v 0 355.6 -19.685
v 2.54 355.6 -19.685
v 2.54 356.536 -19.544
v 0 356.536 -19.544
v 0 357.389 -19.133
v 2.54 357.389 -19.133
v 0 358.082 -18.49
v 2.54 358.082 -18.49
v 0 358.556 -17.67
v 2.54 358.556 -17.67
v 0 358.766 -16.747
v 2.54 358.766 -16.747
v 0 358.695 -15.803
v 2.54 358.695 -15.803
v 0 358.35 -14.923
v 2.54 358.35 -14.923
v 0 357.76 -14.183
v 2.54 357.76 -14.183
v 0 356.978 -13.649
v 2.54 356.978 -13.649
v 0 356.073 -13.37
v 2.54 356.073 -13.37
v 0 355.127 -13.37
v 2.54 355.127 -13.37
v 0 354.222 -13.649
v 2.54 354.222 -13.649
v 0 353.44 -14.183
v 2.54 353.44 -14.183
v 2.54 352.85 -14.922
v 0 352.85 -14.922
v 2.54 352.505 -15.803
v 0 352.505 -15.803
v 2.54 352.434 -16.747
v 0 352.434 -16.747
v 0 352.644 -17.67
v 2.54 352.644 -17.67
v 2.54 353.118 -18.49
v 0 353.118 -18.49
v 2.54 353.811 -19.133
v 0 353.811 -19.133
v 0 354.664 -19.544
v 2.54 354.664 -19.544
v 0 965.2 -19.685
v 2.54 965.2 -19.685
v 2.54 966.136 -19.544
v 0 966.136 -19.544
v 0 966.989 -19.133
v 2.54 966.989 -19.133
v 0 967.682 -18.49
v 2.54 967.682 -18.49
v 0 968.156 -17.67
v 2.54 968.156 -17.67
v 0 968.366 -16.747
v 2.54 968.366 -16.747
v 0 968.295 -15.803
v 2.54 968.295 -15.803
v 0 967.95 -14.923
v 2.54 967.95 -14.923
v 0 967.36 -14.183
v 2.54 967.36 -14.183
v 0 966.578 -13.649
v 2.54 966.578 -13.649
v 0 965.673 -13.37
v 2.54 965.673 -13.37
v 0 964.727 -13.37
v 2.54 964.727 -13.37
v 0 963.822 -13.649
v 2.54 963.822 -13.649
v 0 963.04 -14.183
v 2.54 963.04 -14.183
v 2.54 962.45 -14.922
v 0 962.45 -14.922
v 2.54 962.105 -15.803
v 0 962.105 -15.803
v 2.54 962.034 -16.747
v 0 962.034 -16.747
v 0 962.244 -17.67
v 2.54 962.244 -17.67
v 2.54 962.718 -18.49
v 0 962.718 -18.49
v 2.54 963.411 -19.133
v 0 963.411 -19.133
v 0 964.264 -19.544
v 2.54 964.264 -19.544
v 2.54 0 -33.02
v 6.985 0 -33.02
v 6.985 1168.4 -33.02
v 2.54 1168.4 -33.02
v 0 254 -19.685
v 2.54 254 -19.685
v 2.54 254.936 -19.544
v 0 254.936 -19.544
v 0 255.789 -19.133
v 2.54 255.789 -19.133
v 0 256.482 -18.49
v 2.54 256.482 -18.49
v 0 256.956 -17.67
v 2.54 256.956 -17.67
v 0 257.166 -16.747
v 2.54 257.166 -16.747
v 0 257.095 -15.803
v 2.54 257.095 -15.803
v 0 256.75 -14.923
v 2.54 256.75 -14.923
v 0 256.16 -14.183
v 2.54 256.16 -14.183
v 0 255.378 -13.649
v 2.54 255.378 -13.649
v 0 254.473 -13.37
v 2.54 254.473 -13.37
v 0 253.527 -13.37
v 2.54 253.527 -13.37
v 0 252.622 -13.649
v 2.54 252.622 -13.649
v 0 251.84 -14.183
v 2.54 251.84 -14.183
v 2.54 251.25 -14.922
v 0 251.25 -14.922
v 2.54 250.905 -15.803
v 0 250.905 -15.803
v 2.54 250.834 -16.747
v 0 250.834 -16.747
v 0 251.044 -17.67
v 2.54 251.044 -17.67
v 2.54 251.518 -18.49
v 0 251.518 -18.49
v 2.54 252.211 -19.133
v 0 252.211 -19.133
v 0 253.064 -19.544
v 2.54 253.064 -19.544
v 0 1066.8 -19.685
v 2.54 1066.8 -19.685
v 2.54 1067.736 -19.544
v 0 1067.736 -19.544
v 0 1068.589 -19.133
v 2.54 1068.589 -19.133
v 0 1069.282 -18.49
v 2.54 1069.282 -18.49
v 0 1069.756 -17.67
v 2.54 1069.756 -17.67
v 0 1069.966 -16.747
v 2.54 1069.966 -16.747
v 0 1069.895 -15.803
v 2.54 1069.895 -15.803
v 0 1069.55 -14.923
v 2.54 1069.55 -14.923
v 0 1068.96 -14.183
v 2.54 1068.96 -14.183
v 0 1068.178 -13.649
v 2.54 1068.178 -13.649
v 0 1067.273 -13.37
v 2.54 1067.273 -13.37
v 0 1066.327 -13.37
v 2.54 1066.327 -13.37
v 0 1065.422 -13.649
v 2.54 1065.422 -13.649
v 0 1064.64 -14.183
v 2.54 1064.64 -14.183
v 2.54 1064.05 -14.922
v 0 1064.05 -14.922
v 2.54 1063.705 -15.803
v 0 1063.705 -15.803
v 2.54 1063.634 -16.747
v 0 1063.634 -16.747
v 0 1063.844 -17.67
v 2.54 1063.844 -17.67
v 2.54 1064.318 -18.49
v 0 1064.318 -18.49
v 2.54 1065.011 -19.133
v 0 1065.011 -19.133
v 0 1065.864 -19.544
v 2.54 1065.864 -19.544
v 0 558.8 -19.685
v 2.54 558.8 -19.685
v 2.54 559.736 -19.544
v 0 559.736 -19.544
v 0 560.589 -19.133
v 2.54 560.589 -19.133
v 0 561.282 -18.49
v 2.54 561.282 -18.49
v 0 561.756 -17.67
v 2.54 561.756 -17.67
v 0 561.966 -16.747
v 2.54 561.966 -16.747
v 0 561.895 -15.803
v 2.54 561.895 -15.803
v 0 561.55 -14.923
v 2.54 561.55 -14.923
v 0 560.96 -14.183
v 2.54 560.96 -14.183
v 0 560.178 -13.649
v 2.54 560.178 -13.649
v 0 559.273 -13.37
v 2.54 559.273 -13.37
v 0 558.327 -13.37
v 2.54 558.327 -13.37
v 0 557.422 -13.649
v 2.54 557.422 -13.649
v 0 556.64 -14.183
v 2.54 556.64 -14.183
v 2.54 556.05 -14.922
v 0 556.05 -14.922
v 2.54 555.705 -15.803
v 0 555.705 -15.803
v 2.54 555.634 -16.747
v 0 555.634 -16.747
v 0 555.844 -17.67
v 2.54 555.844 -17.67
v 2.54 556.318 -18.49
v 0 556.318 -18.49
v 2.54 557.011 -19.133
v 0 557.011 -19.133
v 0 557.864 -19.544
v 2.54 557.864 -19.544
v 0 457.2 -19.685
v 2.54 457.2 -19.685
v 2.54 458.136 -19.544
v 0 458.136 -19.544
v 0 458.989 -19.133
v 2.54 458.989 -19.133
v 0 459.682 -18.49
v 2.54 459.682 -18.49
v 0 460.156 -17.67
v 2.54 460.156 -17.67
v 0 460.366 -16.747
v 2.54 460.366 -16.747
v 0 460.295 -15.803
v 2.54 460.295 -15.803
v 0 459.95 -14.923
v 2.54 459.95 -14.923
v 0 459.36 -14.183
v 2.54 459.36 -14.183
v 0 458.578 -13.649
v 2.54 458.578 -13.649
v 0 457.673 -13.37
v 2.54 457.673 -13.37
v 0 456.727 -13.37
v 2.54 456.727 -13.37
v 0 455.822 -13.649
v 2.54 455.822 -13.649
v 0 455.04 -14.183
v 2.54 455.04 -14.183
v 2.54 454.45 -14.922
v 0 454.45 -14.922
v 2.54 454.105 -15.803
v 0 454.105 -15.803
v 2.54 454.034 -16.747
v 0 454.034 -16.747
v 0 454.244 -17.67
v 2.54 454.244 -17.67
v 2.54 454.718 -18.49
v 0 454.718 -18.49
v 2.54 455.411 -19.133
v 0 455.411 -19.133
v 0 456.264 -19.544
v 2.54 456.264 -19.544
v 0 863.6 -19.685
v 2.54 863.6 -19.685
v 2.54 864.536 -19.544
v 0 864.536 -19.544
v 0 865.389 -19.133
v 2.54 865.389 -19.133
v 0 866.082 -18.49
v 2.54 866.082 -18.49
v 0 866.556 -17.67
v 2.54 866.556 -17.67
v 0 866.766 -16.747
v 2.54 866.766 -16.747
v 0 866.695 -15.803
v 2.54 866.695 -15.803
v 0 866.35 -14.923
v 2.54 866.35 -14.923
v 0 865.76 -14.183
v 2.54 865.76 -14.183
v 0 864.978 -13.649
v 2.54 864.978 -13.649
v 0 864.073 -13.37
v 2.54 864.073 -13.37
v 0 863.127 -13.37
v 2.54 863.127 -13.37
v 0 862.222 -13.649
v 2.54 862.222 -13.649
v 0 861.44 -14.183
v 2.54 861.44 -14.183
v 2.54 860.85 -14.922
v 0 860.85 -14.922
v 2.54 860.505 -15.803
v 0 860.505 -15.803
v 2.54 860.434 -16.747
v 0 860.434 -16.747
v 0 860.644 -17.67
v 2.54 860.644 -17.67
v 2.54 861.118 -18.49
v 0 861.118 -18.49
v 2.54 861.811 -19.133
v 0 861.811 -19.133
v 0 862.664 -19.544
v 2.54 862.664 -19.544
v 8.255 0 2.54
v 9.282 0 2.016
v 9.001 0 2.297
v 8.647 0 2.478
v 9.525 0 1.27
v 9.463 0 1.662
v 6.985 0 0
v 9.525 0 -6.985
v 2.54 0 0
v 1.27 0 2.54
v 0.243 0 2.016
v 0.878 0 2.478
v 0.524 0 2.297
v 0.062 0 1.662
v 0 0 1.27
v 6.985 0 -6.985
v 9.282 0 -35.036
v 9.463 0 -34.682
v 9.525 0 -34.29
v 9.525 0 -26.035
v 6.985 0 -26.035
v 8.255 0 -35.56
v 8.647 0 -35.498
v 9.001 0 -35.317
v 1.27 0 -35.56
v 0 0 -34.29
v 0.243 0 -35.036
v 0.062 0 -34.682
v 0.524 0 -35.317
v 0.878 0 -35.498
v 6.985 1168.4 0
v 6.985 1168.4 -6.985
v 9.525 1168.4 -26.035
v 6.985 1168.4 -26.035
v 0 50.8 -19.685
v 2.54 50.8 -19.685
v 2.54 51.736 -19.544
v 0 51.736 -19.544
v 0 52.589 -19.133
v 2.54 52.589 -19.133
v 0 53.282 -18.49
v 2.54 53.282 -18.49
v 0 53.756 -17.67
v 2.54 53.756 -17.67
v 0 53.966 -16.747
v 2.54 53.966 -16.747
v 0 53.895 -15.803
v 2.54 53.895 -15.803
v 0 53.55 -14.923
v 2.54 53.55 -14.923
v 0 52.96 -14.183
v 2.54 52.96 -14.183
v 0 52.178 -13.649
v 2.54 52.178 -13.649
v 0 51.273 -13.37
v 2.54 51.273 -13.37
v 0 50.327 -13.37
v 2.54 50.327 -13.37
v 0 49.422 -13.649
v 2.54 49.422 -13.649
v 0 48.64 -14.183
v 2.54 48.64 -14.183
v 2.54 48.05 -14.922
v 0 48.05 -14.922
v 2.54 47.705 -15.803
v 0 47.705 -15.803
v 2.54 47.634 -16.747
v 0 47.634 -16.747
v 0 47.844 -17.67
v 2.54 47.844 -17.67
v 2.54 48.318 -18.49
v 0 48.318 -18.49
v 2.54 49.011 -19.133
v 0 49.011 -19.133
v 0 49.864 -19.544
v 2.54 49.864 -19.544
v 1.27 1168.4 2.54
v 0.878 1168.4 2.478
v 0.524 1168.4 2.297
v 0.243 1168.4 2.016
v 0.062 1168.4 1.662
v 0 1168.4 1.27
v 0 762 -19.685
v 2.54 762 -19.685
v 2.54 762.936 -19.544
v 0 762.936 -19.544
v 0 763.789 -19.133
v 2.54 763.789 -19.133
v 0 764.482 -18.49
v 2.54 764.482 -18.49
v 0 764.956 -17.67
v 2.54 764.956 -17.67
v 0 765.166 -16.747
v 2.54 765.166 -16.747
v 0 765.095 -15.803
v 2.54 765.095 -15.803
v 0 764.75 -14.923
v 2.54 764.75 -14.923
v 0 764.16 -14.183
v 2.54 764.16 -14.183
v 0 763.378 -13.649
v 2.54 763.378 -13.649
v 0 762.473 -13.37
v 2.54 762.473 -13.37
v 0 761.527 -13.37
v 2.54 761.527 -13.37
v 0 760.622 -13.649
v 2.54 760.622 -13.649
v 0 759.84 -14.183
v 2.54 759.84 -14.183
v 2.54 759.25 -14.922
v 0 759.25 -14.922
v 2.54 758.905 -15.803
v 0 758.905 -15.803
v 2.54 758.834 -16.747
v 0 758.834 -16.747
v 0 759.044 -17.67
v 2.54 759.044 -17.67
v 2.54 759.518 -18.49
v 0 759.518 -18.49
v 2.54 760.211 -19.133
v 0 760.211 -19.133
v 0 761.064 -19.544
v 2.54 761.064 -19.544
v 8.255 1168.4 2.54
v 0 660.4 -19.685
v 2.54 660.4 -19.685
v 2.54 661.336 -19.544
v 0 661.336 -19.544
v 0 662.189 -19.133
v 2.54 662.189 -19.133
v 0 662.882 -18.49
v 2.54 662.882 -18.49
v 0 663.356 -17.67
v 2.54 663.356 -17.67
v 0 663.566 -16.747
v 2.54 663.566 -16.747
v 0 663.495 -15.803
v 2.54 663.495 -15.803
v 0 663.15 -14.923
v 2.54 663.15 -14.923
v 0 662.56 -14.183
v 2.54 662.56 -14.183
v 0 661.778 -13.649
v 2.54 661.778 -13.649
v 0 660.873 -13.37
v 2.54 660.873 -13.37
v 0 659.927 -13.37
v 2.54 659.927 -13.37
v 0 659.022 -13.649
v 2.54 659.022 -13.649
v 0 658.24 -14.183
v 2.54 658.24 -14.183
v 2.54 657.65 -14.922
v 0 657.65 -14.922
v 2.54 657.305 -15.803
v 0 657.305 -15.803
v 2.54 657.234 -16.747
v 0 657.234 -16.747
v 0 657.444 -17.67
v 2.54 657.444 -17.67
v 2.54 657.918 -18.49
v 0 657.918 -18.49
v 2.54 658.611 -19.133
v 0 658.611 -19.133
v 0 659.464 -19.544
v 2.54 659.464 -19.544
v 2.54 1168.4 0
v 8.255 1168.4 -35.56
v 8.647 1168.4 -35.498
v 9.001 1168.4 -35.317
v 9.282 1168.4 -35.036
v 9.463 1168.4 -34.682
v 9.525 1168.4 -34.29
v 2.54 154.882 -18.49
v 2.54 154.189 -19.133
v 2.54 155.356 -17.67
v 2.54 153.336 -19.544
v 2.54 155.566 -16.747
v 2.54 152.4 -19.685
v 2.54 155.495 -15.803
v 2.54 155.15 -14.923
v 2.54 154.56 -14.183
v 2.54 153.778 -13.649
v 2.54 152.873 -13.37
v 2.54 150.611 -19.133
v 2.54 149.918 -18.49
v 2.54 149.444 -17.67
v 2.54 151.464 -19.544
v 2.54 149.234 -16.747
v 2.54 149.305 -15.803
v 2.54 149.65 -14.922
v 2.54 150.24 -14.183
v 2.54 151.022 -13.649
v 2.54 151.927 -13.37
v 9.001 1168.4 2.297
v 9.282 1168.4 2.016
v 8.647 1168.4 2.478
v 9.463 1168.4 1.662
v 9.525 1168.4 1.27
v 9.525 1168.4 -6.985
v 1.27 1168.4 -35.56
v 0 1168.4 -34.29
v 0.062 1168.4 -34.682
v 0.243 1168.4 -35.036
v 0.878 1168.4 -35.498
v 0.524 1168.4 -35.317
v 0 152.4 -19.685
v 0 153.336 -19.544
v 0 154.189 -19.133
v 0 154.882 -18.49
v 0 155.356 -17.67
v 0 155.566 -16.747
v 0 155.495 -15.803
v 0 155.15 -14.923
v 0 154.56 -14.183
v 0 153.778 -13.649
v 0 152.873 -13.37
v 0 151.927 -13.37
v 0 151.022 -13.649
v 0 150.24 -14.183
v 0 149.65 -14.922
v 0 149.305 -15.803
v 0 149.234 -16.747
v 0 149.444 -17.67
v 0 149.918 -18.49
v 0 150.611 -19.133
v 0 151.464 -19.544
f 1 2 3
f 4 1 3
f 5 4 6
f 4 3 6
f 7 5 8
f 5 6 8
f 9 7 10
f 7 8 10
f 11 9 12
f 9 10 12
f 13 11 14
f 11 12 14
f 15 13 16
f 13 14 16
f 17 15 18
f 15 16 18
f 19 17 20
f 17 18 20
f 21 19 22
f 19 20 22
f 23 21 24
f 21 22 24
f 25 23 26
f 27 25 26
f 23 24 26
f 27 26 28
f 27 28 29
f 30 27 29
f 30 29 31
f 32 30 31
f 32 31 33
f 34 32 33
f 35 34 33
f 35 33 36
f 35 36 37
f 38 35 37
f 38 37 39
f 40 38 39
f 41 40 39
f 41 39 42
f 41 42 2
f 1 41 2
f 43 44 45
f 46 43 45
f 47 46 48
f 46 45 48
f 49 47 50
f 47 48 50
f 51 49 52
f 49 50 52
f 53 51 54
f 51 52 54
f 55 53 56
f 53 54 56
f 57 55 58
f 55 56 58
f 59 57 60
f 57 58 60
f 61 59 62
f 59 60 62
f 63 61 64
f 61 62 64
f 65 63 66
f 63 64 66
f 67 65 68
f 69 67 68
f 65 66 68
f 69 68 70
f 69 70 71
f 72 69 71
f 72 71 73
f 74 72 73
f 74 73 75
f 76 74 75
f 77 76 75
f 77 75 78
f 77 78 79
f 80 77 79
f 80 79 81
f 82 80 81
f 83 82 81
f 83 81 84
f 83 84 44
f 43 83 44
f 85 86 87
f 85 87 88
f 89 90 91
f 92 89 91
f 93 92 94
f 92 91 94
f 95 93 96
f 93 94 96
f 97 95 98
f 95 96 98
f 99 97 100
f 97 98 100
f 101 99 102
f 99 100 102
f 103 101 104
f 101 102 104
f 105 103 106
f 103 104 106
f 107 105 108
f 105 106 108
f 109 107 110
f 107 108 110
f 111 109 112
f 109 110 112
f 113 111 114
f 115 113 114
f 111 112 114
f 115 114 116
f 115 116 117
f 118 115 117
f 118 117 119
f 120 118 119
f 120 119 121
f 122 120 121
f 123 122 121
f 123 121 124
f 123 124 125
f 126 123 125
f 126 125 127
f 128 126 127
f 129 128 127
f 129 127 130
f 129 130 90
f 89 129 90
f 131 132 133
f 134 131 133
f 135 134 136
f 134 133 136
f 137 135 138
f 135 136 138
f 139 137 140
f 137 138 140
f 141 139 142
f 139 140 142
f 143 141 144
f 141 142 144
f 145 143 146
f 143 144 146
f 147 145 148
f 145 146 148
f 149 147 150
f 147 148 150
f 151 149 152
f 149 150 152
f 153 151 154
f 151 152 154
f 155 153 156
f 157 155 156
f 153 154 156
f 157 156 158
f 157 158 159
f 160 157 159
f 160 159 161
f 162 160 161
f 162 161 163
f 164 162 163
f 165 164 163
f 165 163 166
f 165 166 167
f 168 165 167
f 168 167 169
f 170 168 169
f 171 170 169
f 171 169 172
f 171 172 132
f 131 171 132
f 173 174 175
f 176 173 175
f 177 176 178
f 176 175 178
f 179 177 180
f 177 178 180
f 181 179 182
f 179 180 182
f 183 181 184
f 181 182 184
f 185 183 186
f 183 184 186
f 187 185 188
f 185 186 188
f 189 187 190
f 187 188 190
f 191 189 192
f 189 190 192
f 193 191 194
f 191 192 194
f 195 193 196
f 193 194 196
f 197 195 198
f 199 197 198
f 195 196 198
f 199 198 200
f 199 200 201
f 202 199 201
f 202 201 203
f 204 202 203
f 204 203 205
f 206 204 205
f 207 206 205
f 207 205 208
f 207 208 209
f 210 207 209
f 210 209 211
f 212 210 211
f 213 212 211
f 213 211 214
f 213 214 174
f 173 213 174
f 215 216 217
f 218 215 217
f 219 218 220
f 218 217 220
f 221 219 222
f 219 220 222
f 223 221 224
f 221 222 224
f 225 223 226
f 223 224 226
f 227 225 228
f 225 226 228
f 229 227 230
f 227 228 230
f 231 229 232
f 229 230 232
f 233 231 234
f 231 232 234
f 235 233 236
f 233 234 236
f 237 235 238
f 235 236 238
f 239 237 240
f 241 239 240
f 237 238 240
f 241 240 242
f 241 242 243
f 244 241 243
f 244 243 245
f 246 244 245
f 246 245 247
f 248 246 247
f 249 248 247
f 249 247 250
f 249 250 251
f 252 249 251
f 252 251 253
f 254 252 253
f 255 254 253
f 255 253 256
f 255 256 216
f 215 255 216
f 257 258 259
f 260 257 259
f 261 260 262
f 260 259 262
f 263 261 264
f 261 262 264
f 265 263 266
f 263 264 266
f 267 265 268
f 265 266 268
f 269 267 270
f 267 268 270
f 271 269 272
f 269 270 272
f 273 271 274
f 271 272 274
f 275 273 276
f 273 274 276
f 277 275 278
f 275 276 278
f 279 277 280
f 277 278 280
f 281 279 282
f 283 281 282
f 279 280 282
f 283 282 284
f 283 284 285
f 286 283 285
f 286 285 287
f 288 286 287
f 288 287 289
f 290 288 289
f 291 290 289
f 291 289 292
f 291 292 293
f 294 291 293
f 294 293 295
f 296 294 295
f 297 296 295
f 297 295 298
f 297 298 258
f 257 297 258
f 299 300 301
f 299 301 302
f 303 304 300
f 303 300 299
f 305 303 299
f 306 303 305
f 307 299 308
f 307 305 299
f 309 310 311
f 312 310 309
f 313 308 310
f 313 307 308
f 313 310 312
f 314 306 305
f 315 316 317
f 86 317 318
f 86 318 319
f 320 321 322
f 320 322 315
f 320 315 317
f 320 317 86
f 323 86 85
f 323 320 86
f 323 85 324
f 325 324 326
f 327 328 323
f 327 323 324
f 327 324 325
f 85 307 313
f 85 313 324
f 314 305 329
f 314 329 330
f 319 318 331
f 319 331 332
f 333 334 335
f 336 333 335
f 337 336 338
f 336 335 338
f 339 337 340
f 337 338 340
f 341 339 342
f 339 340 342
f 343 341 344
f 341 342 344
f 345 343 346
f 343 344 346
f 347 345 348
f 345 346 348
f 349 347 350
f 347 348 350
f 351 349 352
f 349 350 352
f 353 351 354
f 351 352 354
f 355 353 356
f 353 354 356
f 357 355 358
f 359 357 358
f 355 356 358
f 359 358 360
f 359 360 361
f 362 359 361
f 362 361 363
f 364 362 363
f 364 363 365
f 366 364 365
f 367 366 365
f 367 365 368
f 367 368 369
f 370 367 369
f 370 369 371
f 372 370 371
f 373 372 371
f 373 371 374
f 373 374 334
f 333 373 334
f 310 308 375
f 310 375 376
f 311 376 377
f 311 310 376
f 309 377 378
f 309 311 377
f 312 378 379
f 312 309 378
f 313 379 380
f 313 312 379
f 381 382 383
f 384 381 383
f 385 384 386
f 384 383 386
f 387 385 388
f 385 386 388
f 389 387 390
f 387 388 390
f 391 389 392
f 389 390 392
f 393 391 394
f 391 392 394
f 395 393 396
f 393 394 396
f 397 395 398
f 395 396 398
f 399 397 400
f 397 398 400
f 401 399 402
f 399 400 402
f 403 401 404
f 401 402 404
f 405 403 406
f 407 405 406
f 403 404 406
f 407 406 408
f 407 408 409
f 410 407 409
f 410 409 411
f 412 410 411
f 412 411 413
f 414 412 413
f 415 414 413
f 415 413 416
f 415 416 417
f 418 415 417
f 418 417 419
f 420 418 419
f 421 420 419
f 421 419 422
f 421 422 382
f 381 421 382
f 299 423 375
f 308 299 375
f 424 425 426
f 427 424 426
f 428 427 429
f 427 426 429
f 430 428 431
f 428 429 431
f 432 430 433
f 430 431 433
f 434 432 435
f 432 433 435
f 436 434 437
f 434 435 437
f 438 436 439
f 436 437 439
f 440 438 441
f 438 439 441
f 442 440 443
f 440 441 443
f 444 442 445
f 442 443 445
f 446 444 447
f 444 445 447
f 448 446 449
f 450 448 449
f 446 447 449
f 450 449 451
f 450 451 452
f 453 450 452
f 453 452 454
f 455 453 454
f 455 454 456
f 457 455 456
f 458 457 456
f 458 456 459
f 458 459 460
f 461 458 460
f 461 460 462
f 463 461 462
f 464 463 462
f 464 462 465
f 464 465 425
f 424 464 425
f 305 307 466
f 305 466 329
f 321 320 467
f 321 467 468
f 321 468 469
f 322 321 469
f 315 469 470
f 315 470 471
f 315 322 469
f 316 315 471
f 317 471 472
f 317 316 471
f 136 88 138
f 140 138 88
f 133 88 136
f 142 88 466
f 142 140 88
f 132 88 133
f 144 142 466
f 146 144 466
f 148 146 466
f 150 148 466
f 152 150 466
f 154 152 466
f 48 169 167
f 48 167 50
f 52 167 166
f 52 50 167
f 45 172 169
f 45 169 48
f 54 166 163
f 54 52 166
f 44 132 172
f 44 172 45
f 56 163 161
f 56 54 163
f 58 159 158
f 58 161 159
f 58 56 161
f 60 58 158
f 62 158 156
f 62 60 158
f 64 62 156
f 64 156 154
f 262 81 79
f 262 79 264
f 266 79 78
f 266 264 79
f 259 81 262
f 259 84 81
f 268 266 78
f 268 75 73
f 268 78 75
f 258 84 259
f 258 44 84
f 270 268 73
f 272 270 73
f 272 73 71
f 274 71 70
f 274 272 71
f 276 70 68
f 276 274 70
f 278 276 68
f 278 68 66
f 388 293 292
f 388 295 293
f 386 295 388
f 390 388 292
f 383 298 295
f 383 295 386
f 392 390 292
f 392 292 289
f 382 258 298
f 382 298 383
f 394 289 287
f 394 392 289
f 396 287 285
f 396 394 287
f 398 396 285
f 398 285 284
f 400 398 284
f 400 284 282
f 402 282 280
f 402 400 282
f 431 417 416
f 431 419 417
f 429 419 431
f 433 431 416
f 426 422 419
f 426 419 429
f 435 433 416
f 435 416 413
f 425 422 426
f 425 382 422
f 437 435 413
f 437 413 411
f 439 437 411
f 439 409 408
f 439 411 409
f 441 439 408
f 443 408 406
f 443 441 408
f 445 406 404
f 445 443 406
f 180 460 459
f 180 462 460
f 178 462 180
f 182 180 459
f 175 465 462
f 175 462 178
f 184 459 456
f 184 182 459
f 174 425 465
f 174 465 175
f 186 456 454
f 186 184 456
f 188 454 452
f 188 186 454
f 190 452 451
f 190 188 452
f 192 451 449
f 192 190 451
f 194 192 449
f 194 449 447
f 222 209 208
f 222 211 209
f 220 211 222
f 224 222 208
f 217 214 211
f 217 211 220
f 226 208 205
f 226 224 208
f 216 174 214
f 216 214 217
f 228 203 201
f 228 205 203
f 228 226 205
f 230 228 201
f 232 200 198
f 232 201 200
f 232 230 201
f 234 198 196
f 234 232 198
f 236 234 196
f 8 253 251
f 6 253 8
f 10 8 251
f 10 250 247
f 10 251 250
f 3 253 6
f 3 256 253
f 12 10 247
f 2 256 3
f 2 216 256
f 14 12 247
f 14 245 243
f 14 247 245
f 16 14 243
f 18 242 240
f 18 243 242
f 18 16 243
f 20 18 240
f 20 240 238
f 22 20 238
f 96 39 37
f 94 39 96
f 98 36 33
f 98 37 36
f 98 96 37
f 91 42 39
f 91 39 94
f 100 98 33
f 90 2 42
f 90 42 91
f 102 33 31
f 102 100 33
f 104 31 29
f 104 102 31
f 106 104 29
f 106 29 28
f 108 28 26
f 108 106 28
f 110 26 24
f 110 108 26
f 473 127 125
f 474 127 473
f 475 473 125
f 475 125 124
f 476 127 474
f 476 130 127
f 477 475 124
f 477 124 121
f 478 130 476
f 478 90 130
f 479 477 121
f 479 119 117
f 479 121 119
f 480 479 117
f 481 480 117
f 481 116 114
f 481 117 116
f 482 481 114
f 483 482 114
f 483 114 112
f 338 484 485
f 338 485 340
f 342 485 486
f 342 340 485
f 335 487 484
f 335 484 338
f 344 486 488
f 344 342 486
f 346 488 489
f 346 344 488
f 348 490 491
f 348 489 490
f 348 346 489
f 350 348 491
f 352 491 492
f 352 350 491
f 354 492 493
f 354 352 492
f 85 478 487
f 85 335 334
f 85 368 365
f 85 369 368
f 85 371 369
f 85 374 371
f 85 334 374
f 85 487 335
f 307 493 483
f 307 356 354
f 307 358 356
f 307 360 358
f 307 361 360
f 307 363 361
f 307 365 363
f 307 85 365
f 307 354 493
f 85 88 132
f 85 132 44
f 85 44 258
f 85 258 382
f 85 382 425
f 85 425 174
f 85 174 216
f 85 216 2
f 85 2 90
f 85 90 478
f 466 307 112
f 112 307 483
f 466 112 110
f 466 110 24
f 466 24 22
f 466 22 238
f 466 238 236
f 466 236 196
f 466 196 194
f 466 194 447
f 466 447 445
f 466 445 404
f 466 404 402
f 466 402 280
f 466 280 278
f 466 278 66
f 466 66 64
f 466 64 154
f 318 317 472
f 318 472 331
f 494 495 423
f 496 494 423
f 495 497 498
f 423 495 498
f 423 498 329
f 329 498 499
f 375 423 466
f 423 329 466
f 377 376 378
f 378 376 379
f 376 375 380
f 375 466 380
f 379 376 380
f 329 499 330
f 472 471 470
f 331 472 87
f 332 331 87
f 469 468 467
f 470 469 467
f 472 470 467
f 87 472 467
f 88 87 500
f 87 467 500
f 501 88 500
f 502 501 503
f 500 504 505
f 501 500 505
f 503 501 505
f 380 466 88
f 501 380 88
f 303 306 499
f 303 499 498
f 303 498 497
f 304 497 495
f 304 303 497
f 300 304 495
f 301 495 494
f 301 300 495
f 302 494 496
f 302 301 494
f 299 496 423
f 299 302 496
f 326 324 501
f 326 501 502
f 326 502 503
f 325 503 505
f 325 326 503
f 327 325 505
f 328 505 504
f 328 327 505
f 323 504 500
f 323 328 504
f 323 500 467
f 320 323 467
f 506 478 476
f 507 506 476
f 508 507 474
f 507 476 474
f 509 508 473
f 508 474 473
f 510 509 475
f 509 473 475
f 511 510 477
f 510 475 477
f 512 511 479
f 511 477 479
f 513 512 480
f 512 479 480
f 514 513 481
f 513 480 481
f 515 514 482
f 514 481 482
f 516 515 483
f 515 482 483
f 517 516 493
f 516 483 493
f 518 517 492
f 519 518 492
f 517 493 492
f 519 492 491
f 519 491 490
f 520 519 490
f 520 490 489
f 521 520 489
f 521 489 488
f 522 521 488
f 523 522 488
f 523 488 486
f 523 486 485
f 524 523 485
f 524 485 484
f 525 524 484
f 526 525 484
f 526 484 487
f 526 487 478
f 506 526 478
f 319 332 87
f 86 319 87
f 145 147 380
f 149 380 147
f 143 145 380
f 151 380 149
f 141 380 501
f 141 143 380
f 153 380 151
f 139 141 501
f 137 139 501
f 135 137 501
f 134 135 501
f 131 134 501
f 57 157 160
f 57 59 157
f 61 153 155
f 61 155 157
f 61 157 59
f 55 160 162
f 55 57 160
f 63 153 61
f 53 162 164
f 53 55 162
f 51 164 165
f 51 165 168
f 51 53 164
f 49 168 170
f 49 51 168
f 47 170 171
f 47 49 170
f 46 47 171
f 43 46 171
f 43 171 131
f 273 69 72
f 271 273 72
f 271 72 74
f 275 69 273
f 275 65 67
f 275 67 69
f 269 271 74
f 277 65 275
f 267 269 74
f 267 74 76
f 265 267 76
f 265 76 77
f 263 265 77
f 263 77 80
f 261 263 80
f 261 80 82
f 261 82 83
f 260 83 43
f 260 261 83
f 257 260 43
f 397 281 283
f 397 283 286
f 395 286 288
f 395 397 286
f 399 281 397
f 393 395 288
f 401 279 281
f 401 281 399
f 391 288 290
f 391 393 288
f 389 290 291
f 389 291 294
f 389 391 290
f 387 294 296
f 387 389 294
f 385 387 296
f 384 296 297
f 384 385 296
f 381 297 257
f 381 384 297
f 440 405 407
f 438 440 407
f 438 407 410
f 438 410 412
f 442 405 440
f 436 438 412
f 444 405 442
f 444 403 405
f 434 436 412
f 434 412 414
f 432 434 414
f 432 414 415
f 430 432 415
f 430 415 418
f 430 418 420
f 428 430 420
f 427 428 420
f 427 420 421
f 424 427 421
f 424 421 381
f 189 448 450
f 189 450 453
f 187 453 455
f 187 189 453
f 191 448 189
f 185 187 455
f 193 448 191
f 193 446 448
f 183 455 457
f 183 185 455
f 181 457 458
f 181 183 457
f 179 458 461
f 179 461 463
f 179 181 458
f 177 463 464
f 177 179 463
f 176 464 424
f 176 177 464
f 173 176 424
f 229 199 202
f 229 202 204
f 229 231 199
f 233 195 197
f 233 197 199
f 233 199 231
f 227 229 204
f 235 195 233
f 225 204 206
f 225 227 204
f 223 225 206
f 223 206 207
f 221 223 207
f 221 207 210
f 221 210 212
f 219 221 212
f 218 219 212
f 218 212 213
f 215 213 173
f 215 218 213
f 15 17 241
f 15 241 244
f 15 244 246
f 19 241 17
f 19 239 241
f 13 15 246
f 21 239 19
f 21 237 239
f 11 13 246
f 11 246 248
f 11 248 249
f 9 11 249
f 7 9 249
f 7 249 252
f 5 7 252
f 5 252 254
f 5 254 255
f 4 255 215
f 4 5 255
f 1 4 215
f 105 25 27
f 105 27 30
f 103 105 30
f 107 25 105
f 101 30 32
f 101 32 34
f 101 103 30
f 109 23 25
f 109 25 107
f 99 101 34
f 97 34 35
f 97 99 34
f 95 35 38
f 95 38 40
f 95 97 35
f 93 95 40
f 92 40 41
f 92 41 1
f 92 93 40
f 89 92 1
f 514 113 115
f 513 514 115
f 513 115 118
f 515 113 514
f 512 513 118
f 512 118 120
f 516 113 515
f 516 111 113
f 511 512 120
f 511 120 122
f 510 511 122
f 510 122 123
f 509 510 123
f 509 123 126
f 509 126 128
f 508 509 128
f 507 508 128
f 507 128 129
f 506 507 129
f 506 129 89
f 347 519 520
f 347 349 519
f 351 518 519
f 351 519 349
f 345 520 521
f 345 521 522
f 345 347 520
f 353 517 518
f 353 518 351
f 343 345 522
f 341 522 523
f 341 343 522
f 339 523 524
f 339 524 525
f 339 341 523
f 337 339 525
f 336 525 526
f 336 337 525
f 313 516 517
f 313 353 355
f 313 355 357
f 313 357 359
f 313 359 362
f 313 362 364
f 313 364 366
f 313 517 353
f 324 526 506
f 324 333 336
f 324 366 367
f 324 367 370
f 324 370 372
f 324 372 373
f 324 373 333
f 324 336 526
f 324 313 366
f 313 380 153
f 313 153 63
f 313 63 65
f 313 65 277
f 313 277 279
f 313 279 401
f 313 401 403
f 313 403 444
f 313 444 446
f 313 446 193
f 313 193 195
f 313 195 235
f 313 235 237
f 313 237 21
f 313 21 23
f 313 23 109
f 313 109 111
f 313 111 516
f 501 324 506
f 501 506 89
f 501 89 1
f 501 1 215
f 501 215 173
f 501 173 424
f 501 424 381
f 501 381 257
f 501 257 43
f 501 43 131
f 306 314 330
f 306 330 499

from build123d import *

# Parameters (mm, degrees)
BOSS_EXTRUDE1_DEPTH = 1168.4
CUT_EXTRUDE1_REACH  = 4.54
SKETCH2_R           = 3.175


with BuildPart() as part:
    # Sketch1 → Boss-Extrude1 (new body)
    with BuildSketch(Plane(origin=(0, 0, 0), x_dir=(1, 0, 0), z_dir=(0, 1, 0))):
        with BuildLine():
            Line((9.525, 34.29), (9.525, 26.035))
            Line((9.525, 26.035), (6.985, 26.035))
            Line((6.985, 26.035), (6.985, 33.02))
            Line((6.985, 33.02), (2.54, 33.02))
            Line((2.54, 33.02), (2.54, 0))
            Line((2.54, 0), (6.985, 0))
            Line((6.985, 0), (6.985, 6.985))
            Line((6.985, 6.985), (9.525, 6.985))
            Line((9.525, 6.985), (9.525, -1.27))
            ThreePointArc((9.525, -1.27), (9.153025612, -2.168025612), (8.255, -2.54))
            Line((8.255, -2.54), (1.27, -2.54))
            ThreePointArc((1.27, -2.54), (0.371974388, -2.168025612), (0, -1.27))
            Line((0, -1.27), (0, 34.29))
            ThreePointArc((0, 34.29), (0.371974388, 35.188025612), (1.27, 35.56))
            Line((1.27, 35.56), (8.255, 35.56))
            ThreePointArc((8.255, 35.56), (9.153025612, 35.188025612), (9.525, 34.29))
        make_face()
    extrude(amount=BOSS_EXTRUDE1_DEPTH)

    # Sketch2 → Cut-Extrude1 (cut, up to next)
    with BuildSketch(Plane(origin=(2.54, 0, 0), x_dir=(0, 0, -1), z_dir=(1, 0, 0)), mode=Mode.PRIVATE) as cut_extrude1_sk1:
        with Locations((16.51, 50.8)):
            Circle(SKETCH2_R)
    cut_extrude1_tool1 = extrude(cut_extrude1_sk1.sketch, amount=-CUT_EXTRUDE1_REACH, mode=Mode.PRIVATE) & part.part
    add(cut_extrude1_tool1.solids().sort_by_distance((2.54, 50.8, -16.51))[0], mode=Mode.SUBTRACT)
    # Sketch2 → Cut-Extrude1 (cut, up to next)
    with BuildSketch(Plane(origin=(2.54, 0, 0), x_dir=(0, 0, -1), z_dir=(1, 0, 0)), mode=Mode.PRIVATE) as cut_extrude1_sk2:
        with Locations((16.51, 152.4)):
            Circle(SKETCH2_R)
    cut_extrude1_tool2 = extrude(cut_extrude1_sk2.sketch, amount=-CUT_EXTRUDE1_REACH, mode=Mode.PRIVATE) & part.part
    add(cut_extrude1_tool2.solids().sort_by_distance((2.54, 152.4, -16.51))[0], mode=Mode.SUBTRACT)
    # Sketch2 → Cut-Extrude1 (cut, up to next)
    with BuildSketch(Plane(origin=(2.54, 0, 0), x_dir=(0, 0, -1), z_dir=(1, 0, 0)), mode=Mode.PRIVATE) as cut_extrude1_sk3:
        with Locations((16.51, 254)):
            Circle(SKETCH2_R)
    cut_extrude1_tool3 = extrude(cut_extrude1_sk3.sketch, amount=-CUT_EXTRUDE1_REACH, mode=Mode.PRIVATE) & part.part
    add(cut_extrude1_tool3.solids().sort_by_distance((2.54, 254, -16.51))[0], mode=Mode.SUBTRACT)
    # Sketch2 → Cut-Extrude1 (cut, up to next)
    with BuildSketch(Plane(origin=(2.54, 0, 0), x_dir=(0, 0, -1), z_dir=(1, 0, 0)), mode=Mode.PRIVATE) as cut_extrude1_sk4:
        with Locations((16.51, 355.6)):
            Circle(SKETCH2_R)
    cut_extrude1_tool4 = extrude(cut_extrude1_sk4.sketch, amount=-CUT_EXTRUDE1_REACH, mode=Mode.PRIVATE) & part.part
    add(cut_extrude1_tool4.solids().sort_by_distance((2.54, 355.6, -16.51))[0], mode=Mode.SUBTRACT)
    # Sketch2 → Cut-Extrude1 (cut, up to next)
    with BuildSketch(Plane(origin=(2.54, 0, 0), x_dir=(0, 0, -1), z_dir=(1, 0, 0)), mode=Mode.PRIVATE) as cut_extrude1_sk5:
        with Locations((16.51, 457.2)):
            Circle(SKETCH2_R)
    cut_extrude1_tool5 = extrude(cut_extrude1_sk5.sketch, amount=-CUT_EXTRUDE1_REACH, mode=Mode.PRIVATE) & part.part
    add(cut_extrude1_tool5.solids().sort_by_distance((2.54, 457.2, -16.51))[0], mode=Mode.SUBTRACT)
    # Sketch2 → Cut-Extrude1 (cut, up to next)
    with BuildSketch(Plane(origin=(2.54, 0, 0), x_dir=(0, 0, -1), z_dir=(1, 0, 0)), mode=Mode.PRIVATE) as cut_extrude1_sk6:
        with Locations((16.51, 558.8)):
            Circle(SKETCH2_R)
    cut_extrude1_tool6 = extrude(cut_extrude1_sk6.sketch, amount=-CUT_EXTRUDE1_REACH, mode=Mode.PRIVATE) & part.part
    add(cut_extrude1_tool6.solids().sort_by_distance((2.54, 558.8, -16.51))[0], mode=Mode.SUBTRACT)
    # Sketch2 → Cut-Extrude1 (cut, up to next)
    with BuildSketch(Plane(origin=(2.54, 0, 0), x_dir=(0, 0, -1), z_dir=(1, 0, 0)), mode=Mode.PRIVATE) as cut_extrude1_sk7:
        with Locations((16.51, 660.4)):
            Circle(SKETCH2_R)
    cut_extrude1_tool7 = extrude(cut_extrude1_sk7.sketch, amount=-CUT_EXTRUDE1_REACH, mode=Mode.PRIVATE) & part.part
    add(cut_extrude1_tool7.solids().sort_by_distance((2.54, 660.4, -16.51))[0], mode=Mode.SUBTRACT)
    # Sketch2 → Cut-Extrude1 (cut, up to next)
    with BuildSketch(Plane(origin=(2.54, 0, 0), x_dir=(0, 0, -1), z_dir=(1, 0, 0)), mode=Mode.PRIVATE) as cut_extrude1_sk8:
        with Locations((16.51, 762)):
            Circle(SKETCH2_R)
    cut_extrude1_tool8 = extrude(cut_extrude1_sk8.sketch, amount=-CUT_EXTRUDE1_REACH, mode=Mode.PRIVATE) & part.part
    add(cut_extrude1_tool8.solids().sort_by_distance((2.54, 762, -16.51))[0], mode=Mode.SUBTRACT)
    # Sketch2 → Cut-Extrude1 (cut, up to next)
    with BuildSketch(Plane(origin=(2.54, 0, 0), x_dir=(0, 0, -1), z_dir=(1, 0, 0)), mode=Mode.PRIVATE) as cut_extrude1_sk9:
        with Locations((16.51, 863.6)):
            Circle(SKETCH2_R)
    cut_extrude1_tool9 = extrude(cut_extrude1_sk9.sketch, amount=-CUT_EXTRUDE1_REACH, mode=Mode.PRIVATE) & part.part
    add(cut_extrude1_tool9.solids().sort_by_distance((2.54, 863.6, -16.51))[0], mode=Mode.SUBTRACT)
    # Sketch2 → Cut-Extrude1 (cut, up to next)
    with BuildSketch(Plane(origin=(2.54, 0, 0), x_dir=(0, 0, -1), z_dir=(1, 0, 0)), mode=Mode.PRIVATE) as cut_extrude1_sk10:
        with Locations((16.51, 965.2)):
            Circle(SKETCH2_R)
    cut_extrude1_tool10 = extrude(cut_extrude1_sk10.sketch, amount=-CUT_EXTRUDE1_REACH, mode=Mode.PRIVATE) & part.part
    add(cut_extrude1_tool10.solids().sort_by_distance((2.54, 965.2, -16.51))[0], mode=Mode.SUBTRACT)
    # Sketch2 → Cut-Extrude1 (cut, up to next)
    with BuildSketch(Plane(origin=(2.54, 0, 0), x_dir=(0, 0, -1), z_dir=(1, 0, 0)), mode=Mode.PRIVATE) as cut_extrude1_sk11:
        with Locations((16.51, 1066.8)):
            Circle(SKETCH2_R)
    cut_extrude1_tool11 = extrude(cut_extrude1_sk11.sketch, amount=-CUT_EXTRUDE1_REACH, mode=Mode.PRIVATE) & part.part
    add(cut_extrude1_tool11.solids().sort_by_distance((2.54, 1066.8, -16.51))[0], mode=Mode.SUBTRACT)


solid = part.part
